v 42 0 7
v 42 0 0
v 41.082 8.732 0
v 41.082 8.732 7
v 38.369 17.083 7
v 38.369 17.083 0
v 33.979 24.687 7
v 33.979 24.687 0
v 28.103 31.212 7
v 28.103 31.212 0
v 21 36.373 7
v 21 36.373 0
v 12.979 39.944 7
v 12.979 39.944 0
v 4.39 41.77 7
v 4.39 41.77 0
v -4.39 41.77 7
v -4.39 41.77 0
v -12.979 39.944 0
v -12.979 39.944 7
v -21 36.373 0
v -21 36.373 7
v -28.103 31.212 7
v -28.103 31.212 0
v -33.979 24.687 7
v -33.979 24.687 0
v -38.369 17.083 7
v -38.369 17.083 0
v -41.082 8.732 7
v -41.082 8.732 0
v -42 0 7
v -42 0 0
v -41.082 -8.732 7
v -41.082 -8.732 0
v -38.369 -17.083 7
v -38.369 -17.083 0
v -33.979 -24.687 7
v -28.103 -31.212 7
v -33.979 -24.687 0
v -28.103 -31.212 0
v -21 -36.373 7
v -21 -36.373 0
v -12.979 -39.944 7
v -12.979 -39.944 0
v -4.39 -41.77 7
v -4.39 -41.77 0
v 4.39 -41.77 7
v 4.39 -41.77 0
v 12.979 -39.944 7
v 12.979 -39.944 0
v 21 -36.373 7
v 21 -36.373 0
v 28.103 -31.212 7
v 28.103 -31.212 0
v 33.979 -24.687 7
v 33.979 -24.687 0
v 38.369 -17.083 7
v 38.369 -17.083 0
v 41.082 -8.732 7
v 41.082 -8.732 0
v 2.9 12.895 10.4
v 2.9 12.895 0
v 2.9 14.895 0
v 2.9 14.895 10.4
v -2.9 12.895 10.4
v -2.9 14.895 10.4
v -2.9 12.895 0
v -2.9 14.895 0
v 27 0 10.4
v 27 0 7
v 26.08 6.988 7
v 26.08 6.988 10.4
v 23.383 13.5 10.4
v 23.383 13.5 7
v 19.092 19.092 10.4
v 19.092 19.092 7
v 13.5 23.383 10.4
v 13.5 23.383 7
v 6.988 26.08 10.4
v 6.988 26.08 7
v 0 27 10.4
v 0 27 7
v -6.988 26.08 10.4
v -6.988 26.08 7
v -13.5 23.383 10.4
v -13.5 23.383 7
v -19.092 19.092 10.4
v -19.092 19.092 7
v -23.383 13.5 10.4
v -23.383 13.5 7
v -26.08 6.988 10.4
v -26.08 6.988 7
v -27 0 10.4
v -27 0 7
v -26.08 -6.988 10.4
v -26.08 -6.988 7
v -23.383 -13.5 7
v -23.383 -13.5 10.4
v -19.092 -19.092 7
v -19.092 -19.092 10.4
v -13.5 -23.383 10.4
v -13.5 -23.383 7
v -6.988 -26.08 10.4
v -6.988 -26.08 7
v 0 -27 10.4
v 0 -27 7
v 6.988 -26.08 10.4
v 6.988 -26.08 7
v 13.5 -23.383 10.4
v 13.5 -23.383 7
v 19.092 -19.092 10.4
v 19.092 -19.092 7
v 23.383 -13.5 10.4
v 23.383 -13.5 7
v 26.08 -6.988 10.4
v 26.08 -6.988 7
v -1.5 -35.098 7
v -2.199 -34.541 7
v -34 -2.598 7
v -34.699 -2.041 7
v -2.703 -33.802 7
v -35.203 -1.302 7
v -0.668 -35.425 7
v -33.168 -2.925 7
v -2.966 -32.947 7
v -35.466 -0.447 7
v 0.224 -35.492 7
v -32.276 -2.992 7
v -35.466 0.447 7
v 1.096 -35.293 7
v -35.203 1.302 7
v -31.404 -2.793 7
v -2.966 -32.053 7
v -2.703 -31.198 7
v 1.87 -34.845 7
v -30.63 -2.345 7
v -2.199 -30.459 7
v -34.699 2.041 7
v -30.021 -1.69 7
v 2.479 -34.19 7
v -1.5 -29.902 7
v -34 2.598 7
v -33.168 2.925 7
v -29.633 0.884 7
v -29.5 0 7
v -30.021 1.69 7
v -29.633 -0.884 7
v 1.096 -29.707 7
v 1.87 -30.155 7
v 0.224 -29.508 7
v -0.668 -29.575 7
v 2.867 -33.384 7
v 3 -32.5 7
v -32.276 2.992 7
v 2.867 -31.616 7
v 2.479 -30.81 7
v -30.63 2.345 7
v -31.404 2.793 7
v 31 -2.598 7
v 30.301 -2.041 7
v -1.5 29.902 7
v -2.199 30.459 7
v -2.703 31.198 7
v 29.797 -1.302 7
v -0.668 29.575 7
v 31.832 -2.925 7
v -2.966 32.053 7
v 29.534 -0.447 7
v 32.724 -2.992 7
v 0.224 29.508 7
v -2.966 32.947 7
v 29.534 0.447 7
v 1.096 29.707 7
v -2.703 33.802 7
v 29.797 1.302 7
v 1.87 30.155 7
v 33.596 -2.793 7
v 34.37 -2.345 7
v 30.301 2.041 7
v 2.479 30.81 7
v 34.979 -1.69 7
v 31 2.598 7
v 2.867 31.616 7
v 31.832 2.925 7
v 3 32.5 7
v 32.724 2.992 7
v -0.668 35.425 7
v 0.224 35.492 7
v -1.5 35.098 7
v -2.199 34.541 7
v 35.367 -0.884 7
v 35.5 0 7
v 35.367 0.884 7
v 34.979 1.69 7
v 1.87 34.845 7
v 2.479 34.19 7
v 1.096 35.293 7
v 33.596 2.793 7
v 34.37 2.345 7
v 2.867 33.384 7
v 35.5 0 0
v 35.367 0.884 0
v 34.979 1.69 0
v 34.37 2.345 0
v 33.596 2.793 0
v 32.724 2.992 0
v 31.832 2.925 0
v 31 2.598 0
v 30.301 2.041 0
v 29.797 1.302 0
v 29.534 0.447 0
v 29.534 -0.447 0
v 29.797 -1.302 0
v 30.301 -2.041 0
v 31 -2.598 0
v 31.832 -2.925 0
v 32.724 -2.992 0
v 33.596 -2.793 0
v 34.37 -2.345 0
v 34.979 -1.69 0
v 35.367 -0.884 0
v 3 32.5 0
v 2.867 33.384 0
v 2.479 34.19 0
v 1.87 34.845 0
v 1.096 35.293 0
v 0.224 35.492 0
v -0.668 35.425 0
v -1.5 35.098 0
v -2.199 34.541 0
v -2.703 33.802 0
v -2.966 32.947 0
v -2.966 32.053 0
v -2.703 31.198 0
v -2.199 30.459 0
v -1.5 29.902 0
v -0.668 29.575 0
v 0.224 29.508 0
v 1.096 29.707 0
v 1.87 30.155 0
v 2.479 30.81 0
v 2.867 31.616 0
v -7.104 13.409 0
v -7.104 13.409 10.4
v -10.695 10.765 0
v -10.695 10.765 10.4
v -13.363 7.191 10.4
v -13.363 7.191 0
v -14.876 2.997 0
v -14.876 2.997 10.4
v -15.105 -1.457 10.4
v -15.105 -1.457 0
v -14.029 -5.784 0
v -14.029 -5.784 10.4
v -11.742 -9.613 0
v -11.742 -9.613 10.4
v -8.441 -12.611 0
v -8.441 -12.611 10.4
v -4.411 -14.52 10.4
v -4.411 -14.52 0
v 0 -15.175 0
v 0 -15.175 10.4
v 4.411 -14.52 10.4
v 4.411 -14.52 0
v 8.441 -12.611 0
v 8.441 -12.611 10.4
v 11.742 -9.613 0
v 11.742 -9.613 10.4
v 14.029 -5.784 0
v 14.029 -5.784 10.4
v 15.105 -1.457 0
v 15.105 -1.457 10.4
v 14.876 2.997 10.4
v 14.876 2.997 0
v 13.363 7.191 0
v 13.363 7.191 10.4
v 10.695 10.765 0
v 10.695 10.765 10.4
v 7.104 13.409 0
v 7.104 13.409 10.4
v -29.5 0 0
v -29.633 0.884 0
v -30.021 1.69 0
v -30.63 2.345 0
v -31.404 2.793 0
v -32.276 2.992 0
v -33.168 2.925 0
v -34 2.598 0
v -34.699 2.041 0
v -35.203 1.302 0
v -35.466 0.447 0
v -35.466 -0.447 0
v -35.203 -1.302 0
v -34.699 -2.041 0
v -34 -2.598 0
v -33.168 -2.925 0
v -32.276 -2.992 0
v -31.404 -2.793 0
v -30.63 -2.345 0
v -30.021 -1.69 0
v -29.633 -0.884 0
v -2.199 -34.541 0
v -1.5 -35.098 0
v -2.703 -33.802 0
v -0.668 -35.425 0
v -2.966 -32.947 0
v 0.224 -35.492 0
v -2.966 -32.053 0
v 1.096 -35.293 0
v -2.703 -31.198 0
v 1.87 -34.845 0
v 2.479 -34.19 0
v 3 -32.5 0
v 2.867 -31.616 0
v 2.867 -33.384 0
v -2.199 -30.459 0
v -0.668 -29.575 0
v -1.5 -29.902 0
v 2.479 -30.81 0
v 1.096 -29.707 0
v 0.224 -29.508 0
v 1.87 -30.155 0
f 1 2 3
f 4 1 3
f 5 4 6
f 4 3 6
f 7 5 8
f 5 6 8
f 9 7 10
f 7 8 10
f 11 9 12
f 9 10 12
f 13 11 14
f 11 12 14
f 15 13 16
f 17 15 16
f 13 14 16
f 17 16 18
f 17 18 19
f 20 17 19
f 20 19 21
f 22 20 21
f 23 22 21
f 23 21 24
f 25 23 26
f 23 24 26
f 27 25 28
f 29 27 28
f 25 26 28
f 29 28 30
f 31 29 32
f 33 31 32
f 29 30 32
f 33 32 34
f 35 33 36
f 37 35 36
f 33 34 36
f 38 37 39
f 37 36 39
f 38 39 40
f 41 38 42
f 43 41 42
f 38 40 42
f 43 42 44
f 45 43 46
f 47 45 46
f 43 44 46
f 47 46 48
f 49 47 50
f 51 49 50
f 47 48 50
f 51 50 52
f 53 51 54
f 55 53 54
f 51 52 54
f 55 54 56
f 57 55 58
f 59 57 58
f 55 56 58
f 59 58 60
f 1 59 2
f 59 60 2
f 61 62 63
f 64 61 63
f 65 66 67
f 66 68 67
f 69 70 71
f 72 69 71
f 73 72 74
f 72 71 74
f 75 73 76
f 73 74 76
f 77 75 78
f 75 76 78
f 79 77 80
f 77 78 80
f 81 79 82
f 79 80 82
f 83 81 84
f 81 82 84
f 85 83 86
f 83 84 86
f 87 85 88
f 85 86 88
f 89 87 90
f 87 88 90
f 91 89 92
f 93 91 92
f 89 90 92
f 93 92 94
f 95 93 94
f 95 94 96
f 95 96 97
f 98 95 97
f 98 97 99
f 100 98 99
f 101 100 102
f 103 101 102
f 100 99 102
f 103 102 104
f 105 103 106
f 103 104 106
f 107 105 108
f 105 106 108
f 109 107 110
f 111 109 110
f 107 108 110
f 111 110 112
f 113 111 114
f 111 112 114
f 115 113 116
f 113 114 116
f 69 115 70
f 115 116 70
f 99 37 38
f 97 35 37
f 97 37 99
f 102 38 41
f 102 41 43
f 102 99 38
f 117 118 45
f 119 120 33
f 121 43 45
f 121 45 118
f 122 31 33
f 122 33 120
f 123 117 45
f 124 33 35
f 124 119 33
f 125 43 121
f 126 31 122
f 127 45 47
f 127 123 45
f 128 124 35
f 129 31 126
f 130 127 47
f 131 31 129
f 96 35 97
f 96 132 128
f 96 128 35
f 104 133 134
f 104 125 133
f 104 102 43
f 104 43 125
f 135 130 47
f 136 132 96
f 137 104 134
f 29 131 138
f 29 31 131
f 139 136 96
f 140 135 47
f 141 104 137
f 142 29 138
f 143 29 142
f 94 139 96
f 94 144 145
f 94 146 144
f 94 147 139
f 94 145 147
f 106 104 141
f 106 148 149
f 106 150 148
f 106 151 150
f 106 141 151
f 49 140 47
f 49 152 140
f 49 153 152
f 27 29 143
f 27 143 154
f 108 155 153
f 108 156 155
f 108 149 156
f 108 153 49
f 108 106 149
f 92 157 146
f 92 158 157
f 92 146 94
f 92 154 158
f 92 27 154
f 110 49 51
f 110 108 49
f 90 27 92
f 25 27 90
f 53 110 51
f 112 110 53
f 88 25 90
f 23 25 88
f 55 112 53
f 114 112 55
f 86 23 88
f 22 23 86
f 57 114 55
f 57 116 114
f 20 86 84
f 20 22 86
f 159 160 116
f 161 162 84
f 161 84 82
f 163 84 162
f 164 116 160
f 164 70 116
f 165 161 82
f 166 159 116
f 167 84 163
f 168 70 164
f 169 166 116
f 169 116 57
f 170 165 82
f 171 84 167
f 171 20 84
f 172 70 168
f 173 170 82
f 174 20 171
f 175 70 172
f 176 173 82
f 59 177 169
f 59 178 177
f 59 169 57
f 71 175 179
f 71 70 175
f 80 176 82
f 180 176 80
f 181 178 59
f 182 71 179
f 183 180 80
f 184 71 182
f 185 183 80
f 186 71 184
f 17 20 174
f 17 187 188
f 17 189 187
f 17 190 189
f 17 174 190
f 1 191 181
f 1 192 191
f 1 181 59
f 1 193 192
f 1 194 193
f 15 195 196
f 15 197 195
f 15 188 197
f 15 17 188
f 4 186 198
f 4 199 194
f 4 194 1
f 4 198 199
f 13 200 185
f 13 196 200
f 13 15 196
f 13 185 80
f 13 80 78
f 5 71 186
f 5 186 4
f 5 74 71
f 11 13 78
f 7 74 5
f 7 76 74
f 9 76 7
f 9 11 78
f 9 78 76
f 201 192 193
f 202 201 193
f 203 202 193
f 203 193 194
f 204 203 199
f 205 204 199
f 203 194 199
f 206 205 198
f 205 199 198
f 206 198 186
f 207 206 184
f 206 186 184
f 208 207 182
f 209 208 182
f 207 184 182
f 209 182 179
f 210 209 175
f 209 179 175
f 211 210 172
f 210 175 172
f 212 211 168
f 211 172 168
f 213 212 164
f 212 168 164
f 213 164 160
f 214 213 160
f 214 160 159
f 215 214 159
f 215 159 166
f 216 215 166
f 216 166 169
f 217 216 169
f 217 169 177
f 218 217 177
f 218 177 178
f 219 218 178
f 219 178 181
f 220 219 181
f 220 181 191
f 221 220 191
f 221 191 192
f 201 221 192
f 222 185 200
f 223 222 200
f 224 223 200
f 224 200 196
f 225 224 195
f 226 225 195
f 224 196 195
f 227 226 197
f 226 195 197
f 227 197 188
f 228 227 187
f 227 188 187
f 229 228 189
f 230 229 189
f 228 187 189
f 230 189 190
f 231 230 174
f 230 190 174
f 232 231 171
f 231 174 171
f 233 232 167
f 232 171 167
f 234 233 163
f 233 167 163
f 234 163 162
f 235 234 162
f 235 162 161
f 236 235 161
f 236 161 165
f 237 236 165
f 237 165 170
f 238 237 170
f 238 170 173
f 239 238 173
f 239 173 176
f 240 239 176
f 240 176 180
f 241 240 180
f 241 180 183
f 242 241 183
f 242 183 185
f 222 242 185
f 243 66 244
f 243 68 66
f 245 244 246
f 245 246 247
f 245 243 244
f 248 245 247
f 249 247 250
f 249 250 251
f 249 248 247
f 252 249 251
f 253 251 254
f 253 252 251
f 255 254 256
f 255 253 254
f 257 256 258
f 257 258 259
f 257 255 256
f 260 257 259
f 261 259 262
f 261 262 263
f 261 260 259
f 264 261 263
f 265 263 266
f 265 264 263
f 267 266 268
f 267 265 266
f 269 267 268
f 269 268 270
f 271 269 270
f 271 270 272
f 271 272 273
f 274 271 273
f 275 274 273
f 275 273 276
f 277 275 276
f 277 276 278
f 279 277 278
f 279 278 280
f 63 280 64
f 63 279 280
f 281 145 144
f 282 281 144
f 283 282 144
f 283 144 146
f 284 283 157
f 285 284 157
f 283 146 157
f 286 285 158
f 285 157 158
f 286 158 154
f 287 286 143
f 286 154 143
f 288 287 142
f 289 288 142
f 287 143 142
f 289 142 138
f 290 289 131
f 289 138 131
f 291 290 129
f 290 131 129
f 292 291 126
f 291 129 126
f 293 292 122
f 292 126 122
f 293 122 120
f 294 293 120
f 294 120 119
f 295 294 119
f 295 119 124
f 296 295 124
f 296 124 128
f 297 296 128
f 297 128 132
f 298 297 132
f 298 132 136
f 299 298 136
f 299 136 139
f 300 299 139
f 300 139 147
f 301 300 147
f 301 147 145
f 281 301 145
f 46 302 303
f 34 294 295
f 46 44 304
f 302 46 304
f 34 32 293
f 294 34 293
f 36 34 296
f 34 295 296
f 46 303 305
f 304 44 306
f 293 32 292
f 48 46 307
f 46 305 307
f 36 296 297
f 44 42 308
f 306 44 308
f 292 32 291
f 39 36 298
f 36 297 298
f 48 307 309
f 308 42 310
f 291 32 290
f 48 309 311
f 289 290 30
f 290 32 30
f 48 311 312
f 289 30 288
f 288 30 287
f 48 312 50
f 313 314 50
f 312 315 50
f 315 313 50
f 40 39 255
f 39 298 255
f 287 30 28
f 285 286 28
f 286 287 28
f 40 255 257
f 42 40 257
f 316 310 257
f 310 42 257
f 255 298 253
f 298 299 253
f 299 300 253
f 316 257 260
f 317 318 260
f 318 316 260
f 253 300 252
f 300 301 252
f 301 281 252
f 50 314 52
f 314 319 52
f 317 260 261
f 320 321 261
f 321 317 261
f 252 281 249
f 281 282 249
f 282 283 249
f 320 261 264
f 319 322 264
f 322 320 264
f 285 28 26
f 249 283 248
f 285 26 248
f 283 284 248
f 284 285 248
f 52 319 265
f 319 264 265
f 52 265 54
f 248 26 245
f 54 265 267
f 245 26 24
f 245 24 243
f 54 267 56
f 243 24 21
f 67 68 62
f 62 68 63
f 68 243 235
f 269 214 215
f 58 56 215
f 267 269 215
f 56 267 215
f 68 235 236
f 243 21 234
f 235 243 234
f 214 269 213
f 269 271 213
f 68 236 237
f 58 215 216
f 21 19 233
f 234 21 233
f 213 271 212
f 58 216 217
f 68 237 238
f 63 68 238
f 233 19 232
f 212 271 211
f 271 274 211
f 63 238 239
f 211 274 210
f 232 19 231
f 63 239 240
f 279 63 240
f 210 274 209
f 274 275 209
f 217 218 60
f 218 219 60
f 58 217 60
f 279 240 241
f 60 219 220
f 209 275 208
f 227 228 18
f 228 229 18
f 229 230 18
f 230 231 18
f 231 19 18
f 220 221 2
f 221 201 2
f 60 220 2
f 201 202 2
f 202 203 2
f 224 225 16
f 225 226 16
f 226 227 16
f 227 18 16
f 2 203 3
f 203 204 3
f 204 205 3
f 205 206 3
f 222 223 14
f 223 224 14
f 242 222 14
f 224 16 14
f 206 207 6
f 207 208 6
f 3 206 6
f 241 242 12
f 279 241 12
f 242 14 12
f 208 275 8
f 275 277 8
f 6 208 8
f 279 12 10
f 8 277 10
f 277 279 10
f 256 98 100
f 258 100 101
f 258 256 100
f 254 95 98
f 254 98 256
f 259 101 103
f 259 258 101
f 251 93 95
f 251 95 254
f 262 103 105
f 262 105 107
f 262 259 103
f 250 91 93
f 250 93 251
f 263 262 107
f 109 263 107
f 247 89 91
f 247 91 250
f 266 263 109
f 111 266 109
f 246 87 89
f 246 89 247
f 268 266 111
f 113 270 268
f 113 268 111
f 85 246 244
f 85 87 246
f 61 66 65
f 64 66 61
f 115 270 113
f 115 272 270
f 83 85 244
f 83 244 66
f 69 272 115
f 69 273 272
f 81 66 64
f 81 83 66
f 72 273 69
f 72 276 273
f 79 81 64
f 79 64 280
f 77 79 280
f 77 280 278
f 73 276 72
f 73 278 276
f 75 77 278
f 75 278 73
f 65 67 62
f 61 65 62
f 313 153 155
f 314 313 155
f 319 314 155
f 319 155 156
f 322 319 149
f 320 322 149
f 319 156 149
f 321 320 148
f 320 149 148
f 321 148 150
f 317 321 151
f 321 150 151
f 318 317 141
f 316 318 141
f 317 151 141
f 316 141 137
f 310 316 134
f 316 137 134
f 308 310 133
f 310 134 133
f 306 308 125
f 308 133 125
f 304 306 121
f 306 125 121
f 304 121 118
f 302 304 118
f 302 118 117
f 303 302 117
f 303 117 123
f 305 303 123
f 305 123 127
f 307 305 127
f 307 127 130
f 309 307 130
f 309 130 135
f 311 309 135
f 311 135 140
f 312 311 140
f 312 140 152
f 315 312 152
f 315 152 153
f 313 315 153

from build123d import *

# Parameters (mm, degrees)
SKETCH_R     = 42
PAD_DEPTH    = 7
SKETCH003_R  = 27
PAD001_DEPTH = 3.4
SKETCH004_R  = 3
HOLE_DEPTH   = 25


with BuildPart() as part:
    # Sketch → Pad (new body)
    with BuildSketch(Plane.XY):
        Circle(SKETCH_R)
        with BuildLine():
            Line((-2.9, 14.895322), (-2.9, 12.895322))
            Line((-2.9, 12.895322), (2.9, 12.895322))
            Line((2.9, 12.895322), (2.9, 14.895322))
            ThreePointArc((-2.9, 14.895322), (0, -15.175), (2.9, 14.895322))
        make_face(mode=Mode.SUBTRACT)
    extrude(amount=PAD_DEPTH)

    # Sketch003 (on Face7 of Pad) → Pad001 (join)
    with BuildSketch(Plane.XY.offset(7)):
        Circle(SKETCH003_R)
        with BuildLine():
            ThreePointArc((-2.9, 14.895322), (0, -15.175), (2.9, 14.895322))
            Line((2.9, 12.895322), (2.9, 14.895322))
            Line((-2.9, 12.895322), (2.9, 12.895322))
            Line((-2.9, 14.895322), (-2.9, 12.895322))
        make_face(mode=Mode.SUBTRACT)
    extrude(amount=PAD001_DEPTH)

    # Sketch004 (on Face3 of Pad001) → Hole (cut)
    with BuildSketch(Plane.XY.offset(7)):
        with Locations((0, 32.5)):
            Circle(SKETCH004_R)
        with Locations((0, -32.5)):
            Circle(SKETCH004_R)
        with Locations((32.5, 0)):
            Circle(SKETCH004_R)
        with Locations((-32.5, 0)):
            Circle(SKETCH004_R)
    extrude(amount=-HOLE_DEPTH, mode=Mode.SUBTRACT)


solid = part.part
